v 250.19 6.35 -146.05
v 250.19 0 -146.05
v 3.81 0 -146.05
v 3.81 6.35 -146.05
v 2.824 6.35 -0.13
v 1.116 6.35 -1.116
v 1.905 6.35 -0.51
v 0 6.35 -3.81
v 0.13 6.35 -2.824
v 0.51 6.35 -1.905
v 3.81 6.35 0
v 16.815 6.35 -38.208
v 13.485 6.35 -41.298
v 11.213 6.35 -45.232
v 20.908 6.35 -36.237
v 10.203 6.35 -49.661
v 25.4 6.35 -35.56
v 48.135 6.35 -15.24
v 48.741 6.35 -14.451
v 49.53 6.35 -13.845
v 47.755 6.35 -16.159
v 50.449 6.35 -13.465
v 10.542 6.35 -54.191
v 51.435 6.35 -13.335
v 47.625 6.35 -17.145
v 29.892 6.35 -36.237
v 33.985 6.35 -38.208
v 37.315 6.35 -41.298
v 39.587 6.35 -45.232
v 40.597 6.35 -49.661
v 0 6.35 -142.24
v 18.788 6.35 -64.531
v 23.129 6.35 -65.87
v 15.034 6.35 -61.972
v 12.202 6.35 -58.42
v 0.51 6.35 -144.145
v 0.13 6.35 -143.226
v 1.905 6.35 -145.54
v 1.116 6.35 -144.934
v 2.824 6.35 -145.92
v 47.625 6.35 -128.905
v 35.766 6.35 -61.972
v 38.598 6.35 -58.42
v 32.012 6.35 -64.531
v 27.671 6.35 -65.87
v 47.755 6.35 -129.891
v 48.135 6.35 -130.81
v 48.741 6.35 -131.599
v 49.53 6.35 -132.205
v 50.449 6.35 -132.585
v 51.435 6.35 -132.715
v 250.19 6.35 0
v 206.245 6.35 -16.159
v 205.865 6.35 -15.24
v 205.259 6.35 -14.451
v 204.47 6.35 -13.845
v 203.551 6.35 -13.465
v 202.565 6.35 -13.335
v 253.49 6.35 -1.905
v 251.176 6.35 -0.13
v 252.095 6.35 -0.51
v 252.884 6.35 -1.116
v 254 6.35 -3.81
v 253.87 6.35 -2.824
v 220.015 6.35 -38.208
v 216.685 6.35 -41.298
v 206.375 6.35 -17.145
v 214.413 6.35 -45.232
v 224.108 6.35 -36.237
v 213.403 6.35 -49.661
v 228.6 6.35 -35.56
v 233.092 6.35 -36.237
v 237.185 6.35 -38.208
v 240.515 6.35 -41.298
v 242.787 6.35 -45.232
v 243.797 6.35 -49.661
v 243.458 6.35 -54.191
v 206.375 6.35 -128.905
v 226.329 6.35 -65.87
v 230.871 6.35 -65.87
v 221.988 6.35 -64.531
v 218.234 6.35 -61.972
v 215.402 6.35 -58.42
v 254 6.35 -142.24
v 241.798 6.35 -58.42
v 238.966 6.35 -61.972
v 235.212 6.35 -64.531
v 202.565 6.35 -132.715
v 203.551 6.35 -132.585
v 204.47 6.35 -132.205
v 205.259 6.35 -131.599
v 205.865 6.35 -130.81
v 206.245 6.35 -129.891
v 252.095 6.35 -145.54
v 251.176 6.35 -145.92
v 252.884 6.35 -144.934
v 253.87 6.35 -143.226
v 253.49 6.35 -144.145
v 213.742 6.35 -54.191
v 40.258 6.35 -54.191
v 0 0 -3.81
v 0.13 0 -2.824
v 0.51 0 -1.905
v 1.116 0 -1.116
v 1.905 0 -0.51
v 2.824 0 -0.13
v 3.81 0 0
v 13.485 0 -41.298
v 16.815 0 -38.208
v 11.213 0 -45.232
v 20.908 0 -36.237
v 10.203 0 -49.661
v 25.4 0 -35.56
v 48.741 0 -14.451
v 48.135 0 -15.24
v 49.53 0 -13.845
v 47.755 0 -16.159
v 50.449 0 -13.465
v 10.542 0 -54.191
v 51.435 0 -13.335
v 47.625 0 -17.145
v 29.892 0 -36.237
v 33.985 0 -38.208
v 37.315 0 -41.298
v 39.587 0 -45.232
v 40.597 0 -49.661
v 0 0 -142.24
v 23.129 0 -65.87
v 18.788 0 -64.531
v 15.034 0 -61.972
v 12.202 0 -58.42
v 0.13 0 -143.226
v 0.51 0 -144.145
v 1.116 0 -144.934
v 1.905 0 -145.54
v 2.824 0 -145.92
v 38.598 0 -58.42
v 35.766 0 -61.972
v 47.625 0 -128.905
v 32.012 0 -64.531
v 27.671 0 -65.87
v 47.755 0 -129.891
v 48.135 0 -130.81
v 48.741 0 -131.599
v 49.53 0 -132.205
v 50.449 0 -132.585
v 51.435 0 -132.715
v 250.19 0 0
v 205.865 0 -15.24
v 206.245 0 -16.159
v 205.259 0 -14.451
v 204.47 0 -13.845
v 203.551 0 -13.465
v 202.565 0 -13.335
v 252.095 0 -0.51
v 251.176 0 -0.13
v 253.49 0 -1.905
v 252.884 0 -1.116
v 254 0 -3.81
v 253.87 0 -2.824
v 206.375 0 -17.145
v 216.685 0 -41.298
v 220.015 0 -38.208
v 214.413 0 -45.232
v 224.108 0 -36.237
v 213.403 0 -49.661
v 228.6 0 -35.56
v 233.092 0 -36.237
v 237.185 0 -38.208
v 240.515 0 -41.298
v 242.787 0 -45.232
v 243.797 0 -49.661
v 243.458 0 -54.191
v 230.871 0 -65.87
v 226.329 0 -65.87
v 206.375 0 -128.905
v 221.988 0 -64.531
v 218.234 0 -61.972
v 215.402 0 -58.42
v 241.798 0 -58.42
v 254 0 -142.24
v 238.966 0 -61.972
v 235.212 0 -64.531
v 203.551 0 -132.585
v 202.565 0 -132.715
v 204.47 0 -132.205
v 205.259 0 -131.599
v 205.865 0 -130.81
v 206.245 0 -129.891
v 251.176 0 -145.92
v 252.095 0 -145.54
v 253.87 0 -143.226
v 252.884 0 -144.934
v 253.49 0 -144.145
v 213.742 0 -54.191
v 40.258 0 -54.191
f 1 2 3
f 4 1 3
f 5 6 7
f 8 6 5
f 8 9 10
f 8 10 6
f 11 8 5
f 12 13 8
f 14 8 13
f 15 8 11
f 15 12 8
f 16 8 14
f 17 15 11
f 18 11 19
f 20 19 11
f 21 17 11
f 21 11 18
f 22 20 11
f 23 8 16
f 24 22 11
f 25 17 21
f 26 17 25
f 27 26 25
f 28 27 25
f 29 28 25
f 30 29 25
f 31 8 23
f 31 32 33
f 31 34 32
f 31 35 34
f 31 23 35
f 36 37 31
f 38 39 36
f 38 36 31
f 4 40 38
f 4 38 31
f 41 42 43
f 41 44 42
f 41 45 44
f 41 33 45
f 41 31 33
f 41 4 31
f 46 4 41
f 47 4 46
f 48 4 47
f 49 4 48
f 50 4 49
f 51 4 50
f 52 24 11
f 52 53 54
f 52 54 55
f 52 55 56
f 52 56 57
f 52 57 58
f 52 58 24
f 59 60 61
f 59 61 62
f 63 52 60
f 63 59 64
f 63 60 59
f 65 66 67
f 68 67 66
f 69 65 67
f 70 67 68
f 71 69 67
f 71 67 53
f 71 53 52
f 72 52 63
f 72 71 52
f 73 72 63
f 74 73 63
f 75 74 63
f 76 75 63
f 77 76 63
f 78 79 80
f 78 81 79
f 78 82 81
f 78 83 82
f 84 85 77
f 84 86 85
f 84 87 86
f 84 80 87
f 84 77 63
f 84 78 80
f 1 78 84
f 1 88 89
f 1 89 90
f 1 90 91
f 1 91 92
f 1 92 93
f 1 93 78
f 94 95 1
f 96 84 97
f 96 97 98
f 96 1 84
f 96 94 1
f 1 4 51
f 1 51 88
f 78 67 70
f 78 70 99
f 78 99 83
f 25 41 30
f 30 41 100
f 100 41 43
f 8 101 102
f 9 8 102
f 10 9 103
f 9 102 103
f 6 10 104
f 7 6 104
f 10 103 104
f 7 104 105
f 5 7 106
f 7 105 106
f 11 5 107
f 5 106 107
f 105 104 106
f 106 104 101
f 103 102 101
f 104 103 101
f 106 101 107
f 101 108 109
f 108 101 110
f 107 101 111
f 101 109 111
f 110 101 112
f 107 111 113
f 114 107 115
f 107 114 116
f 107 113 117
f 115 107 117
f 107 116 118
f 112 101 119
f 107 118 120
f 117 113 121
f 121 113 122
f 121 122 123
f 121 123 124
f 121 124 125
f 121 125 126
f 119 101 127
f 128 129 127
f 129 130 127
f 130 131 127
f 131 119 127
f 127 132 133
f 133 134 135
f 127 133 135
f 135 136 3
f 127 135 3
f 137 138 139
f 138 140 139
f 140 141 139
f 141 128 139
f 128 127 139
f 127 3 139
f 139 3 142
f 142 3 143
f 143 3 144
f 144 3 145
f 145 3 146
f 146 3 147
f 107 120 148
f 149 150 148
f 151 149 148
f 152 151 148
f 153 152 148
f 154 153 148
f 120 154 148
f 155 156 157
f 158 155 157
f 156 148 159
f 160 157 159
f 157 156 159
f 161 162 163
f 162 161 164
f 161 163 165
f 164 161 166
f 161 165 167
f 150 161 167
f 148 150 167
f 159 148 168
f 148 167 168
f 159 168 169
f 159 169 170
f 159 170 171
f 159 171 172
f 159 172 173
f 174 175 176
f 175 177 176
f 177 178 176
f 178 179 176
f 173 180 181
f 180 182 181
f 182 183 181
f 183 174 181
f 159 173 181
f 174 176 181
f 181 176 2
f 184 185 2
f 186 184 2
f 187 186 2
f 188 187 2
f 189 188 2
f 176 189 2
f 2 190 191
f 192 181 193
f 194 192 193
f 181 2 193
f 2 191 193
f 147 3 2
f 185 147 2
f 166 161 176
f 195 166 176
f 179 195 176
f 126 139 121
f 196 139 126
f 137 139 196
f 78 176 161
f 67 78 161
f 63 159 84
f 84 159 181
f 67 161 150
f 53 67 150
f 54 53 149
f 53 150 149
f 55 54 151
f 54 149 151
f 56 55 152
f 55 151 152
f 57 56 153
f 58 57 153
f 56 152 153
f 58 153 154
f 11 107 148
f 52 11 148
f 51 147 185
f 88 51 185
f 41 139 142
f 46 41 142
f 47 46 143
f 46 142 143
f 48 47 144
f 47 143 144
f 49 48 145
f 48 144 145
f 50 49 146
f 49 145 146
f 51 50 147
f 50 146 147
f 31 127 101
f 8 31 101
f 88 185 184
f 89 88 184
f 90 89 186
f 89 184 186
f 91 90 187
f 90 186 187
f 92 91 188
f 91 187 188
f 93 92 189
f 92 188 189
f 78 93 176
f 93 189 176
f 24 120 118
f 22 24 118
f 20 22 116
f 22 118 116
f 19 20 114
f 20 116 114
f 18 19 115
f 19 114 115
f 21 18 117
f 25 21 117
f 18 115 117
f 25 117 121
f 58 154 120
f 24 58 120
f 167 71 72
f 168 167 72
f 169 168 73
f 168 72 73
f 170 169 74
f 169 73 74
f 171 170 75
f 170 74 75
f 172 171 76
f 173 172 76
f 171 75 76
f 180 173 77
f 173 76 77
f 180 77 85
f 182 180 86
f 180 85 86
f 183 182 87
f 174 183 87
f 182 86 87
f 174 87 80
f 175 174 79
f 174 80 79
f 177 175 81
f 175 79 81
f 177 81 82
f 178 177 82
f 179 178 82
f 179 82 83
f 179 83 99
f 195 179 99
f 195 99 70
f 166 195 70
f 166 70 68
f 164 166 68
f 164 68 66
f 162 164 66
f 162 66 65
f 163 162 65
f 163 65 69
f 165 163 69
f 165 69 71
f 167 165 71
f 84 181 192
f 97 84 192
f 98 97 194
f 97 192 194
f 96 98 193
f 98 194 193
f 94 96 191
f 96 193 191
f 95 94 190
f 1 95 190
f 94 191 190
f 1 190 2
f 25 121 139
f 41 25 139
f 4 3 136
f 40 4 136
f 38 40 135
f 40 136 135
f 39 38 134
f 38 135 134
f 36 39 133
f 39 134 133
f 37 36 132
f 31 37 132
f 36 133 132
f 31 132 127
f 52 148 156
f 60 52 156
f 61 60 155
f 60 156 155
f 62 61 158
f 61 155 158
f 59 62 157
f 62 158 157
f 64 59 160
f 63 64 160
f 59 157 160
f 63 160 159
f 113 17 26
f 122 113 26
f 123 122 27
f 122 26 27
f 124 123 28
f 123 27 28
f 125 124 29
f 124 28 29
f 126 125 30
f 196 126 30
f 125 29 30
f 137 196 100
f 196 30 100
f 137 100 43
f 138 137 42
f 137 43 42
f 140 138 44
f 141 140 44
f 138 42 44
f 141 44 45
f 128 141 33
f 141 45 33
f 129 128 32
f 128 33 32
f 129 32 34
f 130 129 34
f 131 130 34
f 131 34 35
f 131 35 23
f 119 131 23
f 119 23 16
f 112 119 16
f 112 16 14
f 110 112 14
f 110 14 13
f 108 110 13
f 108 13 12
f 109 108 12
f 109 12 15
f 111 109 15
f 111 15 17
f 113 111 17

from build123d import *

# Parameters (mm, degrees)
BOSS_EXTRUDE1_DEPTH = 6.35
SKETCH2_R           = 15.24
CUT_EXTRUDE1_DEPTH  = 294.064711284


with BuildPart() as part:
    # Sketch1 → Boss-Extrude1 (new body)
    with BuildSketch(Plane(origin=(0, 0, 0), x_dir=(1, 0, 0), z_dir=(0, 1, 0))):
        with BuildLine():
            Line((3.81, 0), (250.19, 0))
            ThreePointArc((250.19, 0), (252.884076836, 1.115923164), (254, 3.81))
            Line((254, 3.81), (254, 142.24))
            ThreePointArc((254, 142.24), (252.884076836, 144.934076836), (250.19, 146.05))
            Line((250.19, 146.05), (3.81, 146.05))
            ThreePointArc((3.81, 146.05), (1.115923164, 144.934076836), (0, 142.24))
            Line((0, 142.24), (0, 3.81))
            ThreePointArc((0, 3.81), (1.115923164, 1.115923164), (3.81, 0))
        make_face()
        with BuildLine():
            Line((51.435, 132.715), (202.565, 132.715))
            ThreePointArc((202.565, 132.715), (205.259076836, 131.599076836), (206.375, 128.905))
            Line((206.375, 128.905), (206.375, 17.145))
            ThreePointArc((206.375, 17.145), (205.259076836, 14.450923164), (202.565, 13.335))
            Line((202.565, 13.335), (51.435, 13.335))
            ThreePointArc((51.435, 13.335), (48.740923164, 14.450923164), (47.625, 17.145))
            Line((47.625, 17.145), (47.625, 128.905))
            ThreePointArc((47.625, 128.905), (48.740923164, 131.599076836), (51.435, 132.715))
        make_face(mode=Mode.SUBTRACT)
    extrude(amount=BOSS_EXTRUDE1_DEPTH)

    # Sketch2 → Cut-Extrude1 (cut, through all)
    with BuildSketch(Plane(origin=(0, 6.35, 0), x_dir=(1, 0, 0), z_dir=(0, 1, 0))):
        with Locations(Location((25.4, 50.8, 0), (0, 0, 270))):
            Circle(SKETCH2_R)
        with Locations(Location((228.6, 50.8, 0), (0, 0, 270))):
            Circle(SKETCH2_R)
    extrude(amount=-CUT_EXTRUDE1_DEPTH, mode=Mode.SUBTRACT)


solid = part.part
